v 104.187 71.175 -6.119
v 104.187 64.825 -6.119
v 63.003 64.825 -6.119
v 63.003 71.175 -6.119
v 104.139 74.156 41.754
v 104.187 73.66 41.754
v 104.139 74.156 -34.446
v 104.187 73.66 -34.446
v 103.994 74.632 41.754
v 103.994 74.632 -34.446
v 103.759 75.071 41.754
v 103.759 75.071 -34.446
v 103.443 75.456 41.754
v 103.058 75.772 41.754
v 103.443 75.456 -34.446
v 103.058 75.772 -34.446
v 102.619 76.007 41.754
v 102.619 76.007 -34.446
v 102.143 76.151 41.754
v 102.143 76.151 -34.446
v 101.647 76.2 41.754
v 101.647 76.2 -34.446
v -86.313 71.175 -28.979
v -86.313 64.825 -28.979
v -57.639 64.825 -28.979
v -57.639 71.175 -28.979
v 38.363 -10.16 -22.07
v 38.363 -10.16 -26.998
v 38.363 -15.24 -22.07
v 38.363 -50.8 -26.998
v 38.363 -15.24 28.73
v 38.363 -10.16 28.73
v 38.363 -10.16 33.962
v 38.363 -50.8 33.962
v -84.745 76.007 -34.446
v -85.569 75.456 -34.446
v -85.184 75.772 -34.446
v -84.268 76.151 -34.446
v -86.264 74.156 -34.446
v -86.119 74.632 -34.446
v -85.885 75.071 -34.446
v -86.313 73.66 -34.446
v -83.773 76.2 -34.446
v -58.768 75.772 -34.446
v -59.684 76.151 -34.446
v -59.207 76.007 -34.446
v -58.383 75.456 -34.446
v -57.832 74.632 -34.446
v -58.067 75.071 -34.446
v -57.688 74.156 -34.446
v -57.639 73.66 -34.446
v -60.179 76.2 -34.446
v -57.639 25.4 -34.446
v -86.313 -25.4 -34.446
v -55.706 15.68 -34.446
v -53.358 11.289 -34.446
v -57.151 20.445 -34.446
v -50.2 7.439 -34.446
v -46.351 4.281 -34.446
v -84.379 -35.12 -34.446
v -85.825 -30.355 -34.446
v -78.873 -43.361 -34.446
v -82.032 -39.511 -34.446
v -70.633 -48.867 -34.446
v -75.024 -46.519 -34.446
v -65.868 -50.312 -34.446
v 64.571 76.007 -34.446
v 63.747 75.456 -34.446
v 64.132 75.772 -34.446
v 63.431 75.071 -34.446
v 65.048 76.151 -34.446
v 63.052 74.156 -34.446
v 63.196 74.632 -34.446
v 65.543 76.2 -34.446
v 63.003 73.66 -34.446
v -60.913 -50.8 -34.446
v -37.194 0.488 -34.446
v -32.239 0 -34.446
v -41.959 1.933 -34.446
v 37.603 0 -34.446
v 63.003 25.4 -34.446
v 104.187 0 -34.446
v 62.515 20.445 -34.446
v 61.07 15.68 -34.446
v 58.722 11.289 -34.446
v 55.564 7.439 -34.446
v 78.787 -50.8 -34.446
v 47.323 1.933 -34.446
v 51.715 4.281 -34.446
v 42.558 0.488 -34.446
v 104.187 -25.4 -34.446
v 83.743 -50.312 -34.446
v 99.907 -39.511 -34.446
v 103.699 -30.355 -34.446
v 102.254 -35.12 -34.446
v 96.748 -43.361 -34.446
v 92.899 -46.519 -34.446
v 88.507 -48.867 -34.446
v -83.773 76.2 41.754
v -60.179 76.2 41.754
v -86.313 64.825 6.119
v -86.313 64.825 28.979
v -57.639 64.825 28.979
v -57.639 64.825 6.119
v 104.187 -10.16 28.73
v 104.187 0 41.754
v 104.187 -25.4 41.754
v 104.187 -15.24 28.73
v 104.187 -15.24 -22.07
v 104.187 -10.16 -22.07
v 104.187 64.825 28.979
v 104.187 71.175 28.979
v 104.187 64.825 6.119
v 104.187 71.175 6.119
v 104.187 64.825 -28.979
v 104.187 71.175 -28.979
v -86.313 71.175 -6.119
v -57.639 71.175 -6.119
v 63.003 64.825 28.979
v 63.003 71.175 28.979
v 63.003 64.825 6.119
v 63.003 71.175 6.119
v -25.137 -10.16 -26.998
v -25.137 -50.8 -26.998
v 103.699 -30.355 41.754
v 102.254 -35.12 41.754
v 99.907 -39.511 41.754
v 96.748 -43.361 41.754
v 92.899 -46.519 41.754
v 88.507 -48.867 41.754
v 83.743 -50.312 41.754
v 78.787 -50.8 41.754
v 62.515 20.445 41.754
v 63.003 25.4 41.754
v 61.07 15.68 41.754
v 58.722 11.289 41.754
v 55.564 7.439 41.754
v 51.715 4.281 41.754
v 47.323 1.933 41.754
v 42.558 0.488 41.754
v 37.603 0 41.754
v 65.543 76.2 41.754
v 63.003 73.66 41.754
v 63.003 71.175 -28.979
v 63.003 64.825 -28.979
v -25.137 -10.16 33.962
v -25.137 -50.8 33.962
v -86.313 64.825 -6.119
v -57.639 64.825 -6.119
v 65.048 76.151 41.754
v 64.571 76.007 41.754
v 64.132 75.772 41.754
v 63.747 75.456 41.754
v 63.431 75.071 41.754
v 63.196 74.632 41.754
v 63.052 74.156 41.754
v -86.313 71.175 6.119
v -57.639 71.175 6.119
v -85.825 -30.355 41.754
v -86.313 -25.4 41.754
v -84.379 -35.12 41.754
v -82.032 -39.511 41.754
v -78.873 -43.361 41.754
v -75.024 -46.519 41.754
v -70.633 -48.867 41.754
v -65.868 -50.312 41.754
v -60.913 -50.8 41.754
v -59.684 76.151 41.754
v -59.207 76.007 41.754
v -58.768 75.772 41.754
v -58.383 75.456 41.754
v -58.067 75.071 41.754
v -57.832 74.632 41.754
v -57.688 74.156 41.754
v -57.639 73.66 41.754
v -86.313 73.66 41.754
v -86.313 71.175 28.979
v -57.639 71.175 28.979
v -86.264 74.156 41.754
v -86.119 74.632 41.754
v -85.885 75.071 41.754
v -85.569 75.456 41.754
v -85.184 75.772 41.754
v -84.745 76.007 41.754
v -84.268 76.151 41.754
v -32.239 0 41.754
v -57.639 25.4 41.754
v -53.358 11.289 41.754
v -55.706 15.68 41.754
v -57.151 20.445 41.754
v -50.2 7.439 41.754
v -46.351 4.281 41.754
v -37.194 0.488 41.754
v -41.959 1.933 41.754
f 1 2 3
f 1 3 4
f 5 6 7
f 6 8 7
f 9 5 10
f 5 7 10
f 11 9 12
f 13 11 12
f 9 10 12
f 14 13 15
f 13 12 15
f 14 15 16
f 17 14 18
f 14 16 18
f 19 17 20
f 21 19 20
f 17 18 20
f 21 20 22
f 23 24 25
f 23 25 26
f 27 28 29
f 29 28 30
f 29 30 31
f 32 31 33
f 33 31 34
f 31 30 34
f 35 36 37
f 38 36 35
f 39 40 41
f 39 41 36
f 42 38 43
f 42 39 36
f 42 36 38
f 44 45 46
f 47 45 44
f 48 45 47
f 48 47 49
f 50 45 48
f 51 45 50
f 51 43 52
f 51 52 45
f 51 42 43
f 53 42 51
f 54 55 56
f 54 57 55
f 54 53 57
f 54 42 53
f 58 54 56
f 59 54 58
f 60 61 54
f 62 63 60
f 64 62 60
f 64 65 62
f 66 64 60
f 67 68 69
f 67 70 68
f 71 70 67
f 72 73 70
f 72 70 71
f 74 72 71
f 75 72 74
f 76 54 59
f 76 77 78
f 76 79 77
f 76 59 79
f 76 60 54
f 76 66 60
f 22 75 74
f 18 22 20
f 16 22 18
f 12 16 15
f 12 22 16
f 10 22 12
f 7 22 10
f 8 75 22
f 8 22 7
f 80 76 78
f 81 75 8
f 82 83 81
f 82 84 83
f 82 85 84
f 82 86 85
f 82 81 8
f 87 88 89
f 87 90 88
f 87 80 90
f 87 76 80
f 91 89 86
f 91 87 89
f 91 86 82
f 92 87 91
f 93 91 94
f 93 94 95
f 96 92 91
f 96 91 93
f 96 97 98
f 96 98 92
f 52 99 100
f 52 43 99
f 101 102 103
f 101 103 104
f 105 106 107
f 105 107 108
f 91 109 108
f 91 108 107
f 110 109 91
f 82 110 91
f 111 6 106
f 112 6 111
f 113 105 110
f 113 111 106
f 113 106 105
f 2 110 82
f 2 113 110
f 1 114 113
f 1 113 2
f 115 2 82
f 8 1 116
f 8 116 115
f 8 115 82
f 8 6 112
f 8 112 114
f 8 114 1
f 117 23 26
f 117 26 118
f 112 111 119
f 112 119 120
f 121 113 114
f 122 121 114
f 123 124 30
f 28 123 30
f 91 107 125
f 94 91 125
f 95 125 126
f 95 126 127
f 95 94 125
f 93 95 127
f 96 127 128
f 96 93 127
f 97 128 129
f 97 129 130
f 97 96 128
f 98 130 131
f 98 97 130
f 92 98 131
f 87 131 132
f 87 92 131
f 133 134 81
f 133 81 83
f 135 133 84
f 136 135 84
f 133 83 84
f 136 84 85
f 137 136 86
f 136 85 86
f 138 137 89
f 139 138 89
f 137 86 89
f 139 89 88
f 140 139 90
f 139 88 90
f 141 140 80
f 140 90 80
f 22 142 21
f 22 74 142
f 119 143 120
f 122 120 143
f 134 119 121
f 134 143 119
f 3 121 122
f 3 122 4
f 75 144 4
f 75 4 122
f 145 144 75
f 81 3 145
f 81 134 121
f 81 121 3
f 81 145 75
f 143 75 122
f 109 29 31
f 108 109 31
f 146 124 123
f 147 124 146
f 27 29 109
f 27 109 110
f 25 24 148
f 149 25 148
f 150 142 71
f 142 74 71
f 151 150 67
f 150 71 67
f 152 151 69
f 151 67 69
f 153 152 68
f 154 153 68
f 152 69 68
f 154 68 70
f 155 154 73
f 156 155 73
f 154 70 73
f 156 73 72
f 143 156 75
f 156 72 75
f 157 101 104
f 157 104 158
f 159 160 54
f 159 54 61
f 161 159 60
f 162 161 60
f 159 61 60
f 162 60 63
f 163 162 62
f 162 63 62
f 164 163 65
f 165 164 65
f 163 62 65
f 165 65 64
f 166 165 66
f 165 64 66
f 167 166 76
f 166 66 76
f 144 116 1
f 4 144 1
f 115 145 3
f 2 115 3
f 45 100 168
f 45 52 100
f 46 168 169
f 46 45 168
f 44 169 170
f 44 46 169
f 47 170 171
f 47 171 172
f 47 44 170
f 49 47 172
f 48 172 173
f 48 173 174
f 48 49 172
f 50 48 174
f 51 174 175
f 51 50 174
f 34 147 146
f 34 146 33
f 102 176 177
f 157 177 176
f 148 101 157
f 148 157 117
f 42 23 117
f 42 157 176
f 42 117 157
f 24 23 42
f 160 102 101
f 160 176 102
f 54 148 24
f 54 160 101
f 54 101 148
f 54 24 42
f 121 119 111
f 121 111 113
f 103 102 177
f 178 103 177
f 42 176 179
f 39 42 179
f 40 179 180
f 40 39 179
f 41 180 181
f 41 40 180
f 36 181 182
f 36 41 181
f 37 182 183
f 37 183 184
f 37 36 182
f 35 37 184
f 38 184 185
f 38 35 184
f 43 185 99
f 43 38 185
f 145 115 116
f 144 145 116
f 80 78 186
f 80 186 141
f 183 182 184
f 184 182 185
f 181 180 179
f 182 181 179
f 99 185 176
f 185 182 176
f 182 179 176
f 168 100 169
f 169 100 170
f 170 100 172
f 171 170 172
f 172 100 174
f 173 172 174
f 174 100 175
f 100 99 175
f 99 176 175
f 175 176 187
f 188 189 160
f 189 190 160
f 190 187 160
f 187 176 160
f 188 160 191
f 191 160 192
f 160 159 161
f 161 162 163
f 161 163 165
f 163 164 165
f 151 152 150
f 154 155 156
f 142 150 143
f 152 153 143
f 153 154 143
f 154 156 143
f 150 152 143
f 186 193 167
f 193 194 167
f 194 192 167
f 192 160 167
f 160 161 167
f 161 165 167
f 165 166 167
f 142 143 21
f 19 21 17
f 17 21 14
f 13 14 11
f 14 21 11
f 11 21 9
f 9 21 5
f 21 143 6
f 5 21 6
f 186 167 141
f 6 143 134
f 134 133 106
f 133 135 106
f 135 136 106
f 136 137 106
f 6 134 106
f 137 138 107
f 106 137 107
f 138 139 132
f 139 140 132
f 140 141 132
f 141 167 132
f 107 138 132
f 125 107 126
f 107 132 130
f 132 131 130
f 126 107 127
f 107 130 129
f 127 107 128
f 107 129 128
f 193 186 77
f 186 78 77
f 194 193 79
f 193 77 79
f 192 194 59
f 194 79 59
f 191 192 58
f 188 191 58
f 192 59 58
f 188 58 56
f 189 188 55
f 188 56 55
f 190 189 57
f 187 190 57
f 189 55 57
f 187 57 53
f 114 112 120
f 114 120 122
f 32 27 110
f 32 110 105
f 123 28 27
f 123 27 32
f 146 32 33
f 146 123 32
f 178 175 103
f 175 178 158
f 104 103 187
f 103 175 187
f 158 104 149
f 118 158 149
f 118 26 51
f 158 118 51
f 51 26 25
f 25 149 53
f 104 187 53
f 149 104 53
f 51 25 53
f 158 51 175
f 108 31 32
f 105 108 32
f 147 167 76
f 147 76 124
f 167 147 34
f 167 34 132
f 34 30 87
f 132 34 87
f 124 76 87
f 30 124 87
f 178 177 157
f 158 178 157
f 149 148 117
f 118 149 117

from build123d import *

# Parameters (mm, degrees)
SKETCH1_W           = 190.5
SKETCH1_H           = 76.2
BOSS_EXTRUDE1_DEPTH = 50.8
SKETCH2_W           = 28.67365349
SKETCH2_H           = 76.2
SKETCH2_W_2         = 41.184262463
BOSS_EXTRUDE2_DEPTH = 76.2
FILLET1_R           = 25.4
SKETCH4_W           = 22.86
SKETCH4_H           = 6.35
CUT_EXTRUDE1_DEPTH  = 210.380189247
FILLET2_R           = 2.54
SKETCH5_W           = 63.5
SKETCH5_H           = 60.96
CUT_EXTRUDE3_DEPTH  = 40.64
SKETCH7_W           = 50.8
SKETCH7_H           = 5.08
CUT_EXTRUDE4_DEPTH  = 76.2


with BuildPart() as part:
    # Sketch1 → Boss-Extrude1 (new body)
    with BuildSketch(Plane(origin=(0, 0, 0), x_dir=(1, 0, 0), z_dir=(0, 1, 0))):
        with Locations((8.93730635, -3.65372617)):
            Rectangle(SKETCH1_W, SKETCH1_H)
    extrude(amount=-BOSS_EXTRUDE1_DEPTH)

    # Sketch2 → Boss-Extrude2 (add)
    with BuildSketch(Plane(origin=(0, 0, 0), x_dir=(1, 0, 0), z_dir=(0, 1, 0))):
        with Locations((-71.975866905, -3.65372617)):
            Rectangle(SKETCH2_W, SKETCH2_H)
        with Locations((83.595175119, -3.65372617)):
            Rectangle(SKETCH2_W_2, SKETCH2_H)
    extrude(amount=BOSS_EXTRUDE2_DEPTH)

    # Fillet1
    fillet1_edges = [part.edges().sort_by_distance(p)[0] for p in [
        (104.18730635, -50.8, 3.65372617),
        (-57.63904016, 0, 3.65372617),
        (63.003043887, 0, 3.65372617),
        (-86.31269365, -50.8, 3.65372617),
    ]]
    fillet(fillet1_edges, radius=FILLET1_R)

    # Sketch4 → Cut-Extrude1 (cut, symmetric)
    with BuildSketch(Plane.ZY.offset(86.31269365)):
        with Locations((-17.548825197, 68.000163991)):
            Rectangle(SKETCH4_W, SKETCH4_H)
    cut_extrude1 = extrude(amount=CUT_EXTRUDE1_DEPTH, both=True, mode=Mode.SUBTRACT)

    # Mirror1: Cut-Extrude1 across plane
    add(cut_extrude1.mirror(Plane.XY), mode=Mode.SUBTRACT)

    # Fillet2
    fillet2_edges = [part.edges().sort_by_distance(p)[0] for p in [
        (-86.31269365, 76.2, 3.65372617),
        (-57.63904016, 76.2, 3.65372617),
        (104.18730635, 76.2, 3.65372617),
        (63.003043887, 76.2, 3.65372617),
    ]]
    fillet(fillet2_edges, radius=FILLET2_R)

    # Sketch5 → Cut-Extrude3 (cut)
    with BuildSketch(Plane.XZ.offset(50.8)):
        with Locations((6.612576952, 3.481502269)):
            Rectangle(SKETCH5_W, SKETCH5_H)
    extrude(amount=-CUT_EXTRUDE3_DEPTH, mode=Mode.SUBTRACT)

    # Sketch7 → Cut-Extrude4 (cut)
    with BuildSketch(Plane.ZY.offset(-38.362576952)):
        with Locations((3.329763468, -12.7)):
            Rectangle(SKETCH7_W, SKETCH7_H)
    extrude(amount=-CUT_EXTRUDE4_DEPTH, mode=Mode.SUBTRACT)


solid = part.part
